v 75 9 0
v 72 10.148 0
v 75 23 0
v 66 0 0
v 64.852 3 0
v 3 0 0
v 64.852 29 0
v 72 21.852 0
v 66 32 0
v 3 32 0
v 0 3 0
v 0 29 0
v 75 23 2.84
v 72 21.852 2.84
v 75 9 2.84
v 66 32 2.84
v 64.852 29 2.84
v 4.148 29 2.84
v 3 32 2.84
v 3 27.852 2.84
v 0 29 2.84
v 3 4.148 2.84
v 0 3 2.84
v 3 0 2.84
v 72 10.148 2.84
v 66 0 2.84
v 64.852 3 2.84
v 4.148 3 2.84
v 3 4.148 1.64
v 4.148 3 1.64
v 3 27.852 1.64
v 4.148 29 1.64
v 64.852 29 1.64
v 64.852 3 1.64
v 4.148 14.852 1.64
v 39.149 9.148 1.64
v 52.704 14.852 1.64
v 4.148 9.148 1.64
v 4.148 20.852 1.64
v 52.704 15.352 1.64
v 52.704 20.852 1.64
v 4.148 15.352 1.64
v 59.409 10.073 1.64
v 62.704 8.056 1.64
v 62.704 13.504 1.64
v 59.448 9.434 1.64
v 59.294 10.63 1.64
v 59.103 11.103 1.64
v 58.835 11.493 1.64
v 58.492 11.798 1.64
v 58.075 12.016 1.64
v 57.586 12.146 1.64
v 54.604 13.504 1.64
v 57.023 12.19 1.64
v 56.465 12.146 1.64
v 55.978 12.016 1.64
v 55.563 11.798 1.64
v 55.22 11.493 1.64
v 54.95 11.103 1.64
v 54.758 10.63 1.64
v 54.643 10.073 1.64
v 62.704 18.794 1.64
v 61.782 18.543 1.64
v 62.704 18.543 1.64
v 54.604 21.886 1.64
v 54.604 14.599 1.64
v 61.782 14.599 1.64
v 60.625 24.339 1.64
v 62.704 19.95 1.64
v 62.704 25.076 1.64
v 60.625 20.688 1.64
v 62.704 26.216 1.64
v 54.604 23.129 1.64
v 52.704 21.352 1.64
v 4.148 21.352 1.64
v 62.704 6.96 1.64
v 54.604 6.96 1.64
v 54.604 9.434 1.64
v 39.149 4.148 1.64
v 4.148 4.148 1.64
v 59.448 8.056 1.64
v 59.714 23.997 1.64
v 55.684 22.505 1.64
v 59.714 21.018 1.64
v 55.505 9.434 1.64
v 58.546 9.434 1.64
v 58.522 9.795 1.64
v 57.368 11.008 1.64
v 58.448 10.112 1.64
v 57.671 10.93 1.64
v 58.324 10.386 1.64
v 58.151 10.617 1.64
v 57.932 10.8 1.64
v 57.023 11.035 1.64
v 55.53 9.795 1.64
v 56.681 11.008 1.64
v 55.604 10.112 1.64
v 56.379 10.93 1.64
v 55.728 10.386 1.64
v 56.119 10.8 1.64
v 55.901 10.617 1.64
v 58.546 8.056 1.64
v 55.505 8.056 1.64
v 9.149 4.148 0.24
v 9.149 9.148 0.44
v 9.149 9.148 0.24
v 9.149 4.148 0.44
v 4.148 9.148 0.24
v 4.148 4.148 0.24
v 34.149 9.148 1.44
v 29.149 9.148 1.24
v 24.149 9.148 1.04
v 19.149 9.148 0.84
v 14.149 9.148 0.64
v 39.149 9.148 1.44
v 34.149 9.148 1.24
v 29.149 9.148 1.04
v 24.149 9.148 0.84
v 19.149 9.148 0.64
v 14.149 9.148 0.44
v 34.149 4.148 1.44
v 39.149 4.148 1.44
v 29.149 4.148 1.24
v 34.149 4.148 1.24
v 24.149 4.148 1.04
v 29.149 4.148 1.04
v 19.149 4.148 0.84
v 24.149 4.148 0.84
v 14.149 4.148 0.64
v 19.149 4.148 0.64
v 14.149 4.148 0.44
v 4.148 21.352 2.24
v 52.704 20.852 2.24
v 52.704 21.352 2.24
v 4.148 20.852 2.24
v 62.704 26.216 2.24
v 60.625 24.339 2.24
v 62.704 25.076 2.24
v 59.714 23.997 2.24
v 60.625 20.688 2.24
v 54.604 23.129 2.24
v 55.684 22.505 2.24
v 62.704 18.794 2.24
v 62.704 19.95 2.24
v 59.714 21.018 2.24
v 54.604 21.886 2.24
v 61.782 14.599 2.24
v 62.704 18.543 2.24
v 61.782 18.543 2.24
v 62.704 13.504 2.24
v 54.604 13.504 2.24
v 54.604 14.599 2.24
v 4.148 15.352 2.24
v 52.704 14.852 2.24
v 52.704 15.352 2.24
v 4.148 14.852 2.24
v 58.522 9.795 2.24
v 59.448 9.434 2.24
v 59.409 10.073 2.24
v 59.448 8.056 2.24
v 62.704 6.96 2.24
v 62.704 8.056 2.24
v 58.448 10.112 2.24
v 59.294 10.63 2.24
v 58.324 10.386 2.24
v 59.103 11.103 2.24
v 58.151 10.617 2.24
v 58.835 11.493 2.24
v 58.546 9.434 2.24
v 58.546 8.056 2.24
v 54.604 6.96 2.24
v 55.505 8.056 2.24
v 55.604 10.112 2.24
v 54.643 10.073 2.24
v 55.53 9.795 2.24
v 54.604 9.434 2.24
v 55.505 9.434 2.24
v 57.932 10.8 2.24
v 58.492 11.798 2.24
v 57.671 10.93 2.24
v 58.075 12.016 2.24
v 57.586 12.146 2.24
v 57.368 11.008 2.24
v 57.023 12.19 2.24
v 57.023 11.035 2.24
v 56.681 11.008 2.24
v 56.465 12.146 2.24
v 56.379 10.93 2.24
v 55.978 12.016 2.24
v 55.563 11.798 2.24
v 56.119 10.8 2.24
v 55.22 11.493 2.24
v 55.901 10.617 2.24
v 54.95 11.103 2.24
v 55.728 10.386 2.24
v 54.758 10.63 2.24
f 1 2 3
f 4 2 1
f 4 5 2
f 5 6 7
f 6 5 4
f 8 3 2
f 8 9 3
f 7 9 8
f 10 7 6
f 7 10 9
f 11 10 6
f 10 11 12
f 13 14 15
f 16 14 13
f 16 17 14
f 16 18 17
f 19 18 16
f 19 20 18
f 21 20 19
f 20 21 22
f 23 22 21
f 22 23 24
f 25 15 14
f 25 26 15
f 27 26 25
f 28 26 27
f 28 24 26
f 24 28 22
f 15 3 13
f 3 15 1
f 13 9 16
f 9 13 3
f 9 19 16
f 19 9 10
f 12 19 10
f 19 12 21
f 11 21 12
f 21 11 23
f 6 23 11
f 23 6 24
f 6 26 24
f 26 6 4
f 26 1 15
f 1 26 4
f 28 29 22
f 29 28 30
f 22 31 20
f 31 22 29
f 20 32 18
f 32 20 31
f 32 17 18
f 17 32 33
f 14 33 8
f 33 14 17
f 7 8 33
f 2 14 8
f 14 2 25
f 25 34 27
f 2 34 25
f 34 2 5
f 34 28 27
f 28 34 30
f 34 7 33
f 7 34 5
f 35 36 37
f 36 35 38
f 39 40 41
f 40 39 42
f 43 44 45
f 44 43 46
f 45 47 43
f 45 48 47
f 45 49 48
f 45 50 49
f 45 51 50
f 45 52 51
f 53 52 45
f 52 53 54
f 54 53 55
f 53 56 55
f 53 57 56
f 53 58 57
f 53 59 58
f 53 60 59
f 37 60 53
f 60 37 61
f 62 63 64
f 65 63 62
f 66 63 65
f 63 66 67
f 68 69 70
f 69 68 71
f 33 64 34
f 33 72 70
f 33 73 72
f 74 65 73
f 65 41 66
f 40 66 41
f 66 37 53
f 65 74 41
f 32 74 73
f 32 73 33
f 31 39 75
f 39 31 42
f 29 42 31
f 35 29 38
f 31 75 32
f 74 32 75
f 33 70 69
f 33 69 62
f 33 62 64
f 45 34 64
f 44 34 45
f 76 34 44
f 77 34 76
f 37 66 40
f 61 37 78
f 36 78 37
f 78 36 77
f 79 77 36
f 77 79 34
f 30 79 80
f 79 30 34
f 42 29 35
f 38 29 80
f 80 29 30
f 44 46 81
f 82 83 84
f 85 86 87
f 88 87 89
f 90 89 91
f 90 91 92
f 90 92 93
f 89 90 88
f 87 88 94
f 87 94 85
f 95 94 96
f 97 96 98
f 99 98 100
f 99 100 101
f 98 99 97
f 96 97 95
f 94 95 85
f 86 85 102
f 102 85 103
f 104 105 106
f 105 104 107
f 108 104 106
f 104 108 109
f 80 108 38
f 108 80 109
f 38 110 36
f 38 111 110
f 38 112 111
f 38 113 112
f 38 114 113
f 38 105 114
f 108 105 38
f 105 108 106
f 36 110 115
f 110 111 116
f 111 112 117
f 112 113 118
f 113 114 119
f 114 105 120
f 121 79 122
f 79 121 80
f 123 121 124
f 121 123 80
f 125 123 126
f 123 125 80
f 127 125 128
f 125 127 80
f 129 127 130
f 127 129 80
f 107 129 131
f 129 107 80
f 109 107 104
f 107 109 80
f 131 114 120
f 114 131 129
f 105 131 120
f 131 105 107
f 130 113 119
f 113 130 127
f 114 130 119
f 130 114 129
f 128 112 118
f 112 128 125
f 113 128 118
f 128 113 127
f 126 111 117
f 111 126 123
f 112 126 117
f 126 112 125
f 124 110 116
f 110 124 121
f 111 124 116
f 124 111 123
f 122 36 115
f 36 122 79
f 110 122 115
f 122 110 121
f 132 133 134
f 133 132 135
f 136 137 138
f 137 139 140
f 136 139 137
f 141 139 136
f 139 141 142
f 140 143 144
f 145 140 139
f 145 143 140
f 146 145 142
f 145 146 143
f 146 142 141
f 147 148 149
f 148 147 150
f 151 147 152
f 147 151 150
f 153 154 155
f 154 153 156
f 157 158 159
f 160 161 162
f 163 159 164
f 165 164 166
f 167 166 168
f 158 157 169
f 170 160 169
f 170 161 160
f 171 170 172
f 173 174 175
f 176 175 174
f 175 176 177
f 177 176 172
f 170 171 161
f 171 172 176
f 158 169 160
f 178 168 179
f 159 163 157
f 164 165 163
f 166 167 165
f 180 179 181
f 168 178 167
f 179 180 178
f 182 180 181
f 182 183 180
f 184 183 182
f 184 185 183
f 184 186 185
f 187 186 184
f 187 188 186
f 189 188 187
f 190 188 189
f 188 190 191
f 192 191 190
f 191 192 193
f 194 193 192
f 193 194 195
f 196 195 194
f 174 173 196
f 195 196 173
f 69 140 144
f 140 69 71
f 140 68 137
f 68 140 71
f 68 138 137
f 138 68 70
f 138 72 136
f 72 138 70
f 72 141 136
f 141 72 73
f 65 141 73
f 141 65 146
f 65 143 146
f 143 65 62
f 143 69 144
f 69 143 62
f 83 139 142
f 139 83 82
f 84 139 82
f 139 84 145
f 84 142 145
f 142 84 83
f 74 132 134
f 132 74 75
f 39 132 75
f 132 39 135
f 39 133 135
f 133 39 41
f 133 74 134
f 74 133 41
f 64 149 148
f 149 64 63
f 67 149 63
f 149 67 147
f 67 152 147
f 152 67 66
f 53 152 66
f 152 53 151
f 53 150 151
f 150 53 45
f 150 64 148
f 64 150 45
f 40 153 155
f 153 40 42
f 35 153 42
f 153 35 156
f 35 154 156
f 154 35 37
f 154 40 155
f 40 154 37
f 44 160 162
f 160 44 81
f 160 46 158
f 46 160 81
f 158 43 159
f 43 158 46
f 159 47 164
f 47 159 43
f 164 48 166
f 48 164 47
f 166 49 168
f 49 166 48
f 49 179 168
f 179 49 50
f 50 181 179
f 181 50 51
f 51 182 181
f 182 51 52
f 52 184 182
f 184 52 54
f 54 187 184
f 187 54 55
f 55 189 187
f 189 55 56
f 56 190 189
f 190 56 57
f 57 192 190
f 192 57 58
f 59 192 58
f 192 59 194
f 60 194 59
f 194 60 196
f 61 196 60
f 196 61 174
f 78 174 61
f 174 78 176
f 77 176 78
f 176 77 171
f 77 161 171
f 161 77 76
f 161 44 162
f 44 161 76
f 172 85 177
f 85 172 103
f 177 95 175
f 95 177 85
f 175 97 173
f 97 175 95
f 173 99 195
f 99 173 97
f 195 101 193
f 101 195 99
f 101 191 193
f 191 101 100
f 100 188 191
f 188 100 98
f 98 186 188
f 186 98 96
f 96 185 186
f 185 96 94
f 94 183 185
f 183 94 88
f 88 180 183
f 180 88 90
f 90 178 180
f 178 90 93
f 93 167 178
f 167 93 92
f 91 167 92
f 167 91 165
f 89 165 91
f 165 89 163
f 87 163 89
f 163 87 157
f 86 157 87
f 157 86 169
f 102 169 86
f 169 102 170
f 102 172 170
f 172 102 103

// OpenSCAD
// Swatch to fit 8 in a 2x1x6 GridFinity bin, based in shape
// around the Extrutim printables design, which is based around
// someone else's anyway.  Defaults here will give you a swatch with two spaces
// to write–in the manufacturer and color name (if useful).  All you need to do
// is customize the material.

// Copyright 2024, Sam Vilain.  All rights reserved.
// You can use this under the terms of the GPL version 3 or later.  For other
// terms, please get in touch.

/* [Swatch Print Settings] */
initial_layer_height = 0.24;
layer_height = 0.2;

// Color printing mode
color_mode = "MMU";  // [MMU:Multiple filament changes, Manual:Single filament change, Mono:Single color swatches]
// check to produce just the body STL.  It will have no label unless "single filament change" is selected.
no_label = false;
// check to produce just the label STL.   If both options are left unchecked, a single monocolor swatch STL will be produced.
no_body = false;


/* [Filament Details] */
// Use underscores to print a line for write–in (or label–on)
manufacturer = "";
//manufacturer = "________________";
// the main material for printing purposes
material = "PLA";  // [PLA, PETG, ABS, ASA, TPU, PC, PCABS, PCTG, PP, PET, PA, PPA, PAHT, ____]
// to add –CF, –GF, etc (or a "+" for unspecified copolymers)
filler = ""; // ["":None, +:Copolymer, CF: Carbon Fiber, GF: Glass Fiber, WF: Wood, X: Other]
// the color may be obvious, but if the vendor has a lot of colors for a material, this can help make sure the swatchholder gets the right one when ordering
color_name = "";

/* [Verbose filament details] */
// These extra details are available for scripts converting information from filament profiles to swatches or can be set manually..  Most importantly, to help give quick cost vs color decisions:
cost_per_kg = -1;

// HTML color code; 3-digit websafe color codes or full 6-digit value.  Printed on the swatch, and used to color the preview in OpenSCAD.
color_code = "";
// Color for the label; if printing single color swatches, using a color with good contrast will make the label easier to read here in OpenSCAD, but otherwise have no effect.  Clear this entry to show the label in the same color as the swatch.
contrast_color = "#000";

// set to add print setings to the swatch
nozzle_temp_range = [-1, -1];
bed_temp_range = [-1, -1];
chamber_temp_range = [-1, -1];
part_fan_speed = [-1, -1];
// If you just want to type what goes in the print settings space, enter it here
print_settings_override = "";

/* [Font for Manufacturer] */
// The font to use for the Manufacturer
label_manufacturer_font = "Gotham";
// If the manufacturer name doesn't fit, try tweaking this, and treat font height as a last resort.  Various fonts have different names for these widths, nothing is standard, X11 font names were the Betamax of this
label_manufacturer_font_width = "";  // ["":Default, Narrow, XNarrow:Extra Narrow, Cond:"Cond(ensed)", Condensed]
// Use the boldest font weight which fits and is still legible for best printability
label_manufacturer_font_weight = "Bold";  // ["":Default, Thin, Light, Book, Medium, Bold, Heavy, Ultra]
label_manufacturer_font_style = "";  // ["":Regular, Italic]
label_manufacturer_font_height = 7; // [5:0.25:8]

/* [Font for Material Code] */
// The font to use for the Material: recommend to use the same as the major font.
label_material_font = "Gotham"; 
// Shrink this before lowering the font height for longer filament types
label_material_font_width = "Narrow";  // ["":Default, Narrow, XNarrow:Extra Narrow, Cond:"Cond(ensed)", Condensed]
label_material_font_weight = "Bold";  // ["":Default, Thin, Light, Book, Medium, Bold, Heavy, Ultra]
label_material_font_style = "";  // ["":Regular, Italic,]
label_material_font_height = 8; // [6:0.5:10]

/* [Font for other details] */
// The font to use for everything else
label_details_font = "Noto Sans";
label_details_font_width = "";  // ["":Default, SemiCondensed, Condensed, ExtraCondensed]
label_details_font_weight = "";  // [Thin, ExtraLight, Light, Medium, "":Default, SemiBold, Bold, ExtraBold, Black]
label_details_font_style = "";  // ["":Regular, Italic]
label_details_font_height = 5; // [4:0.25:7]

// Just the color name in italics looks good and squeezes a bit more in, it seems
label_color_name_font_style = "Italic"; // ["":Regular, Italic]

/* [Font for print settings] */
// if temperatures are specified, they are printed with this width and height; font and weight come from the "details" setting.
label_settings_font_width = ""; //  ["":Default, SemiCondensed, Condensed, ExtraCondensed, Narrow, XNarrow:Extra Narrow, Cond:"Cond(ensed)", Condensed]
label_settings_font_height = 4; // [3:0.25:6]
// Pick a symbol for each setting prefix, but sadly OpenSCAD doesn't do a good job of finding the appropriate font that contains the glyphs for the unicode characters.
label_settings_nozzle_temp_glyph = "T:";  // ["T:", Ⓣ, 🅃, 🆃, "N:", Ⓝ, 🄽, 🅽, ↓, 🌡, ⚺, ⛉, ⛊]
label_settings_bed_temp_glyph = "B:";  // ["B:", Ⓑ , 🄱, 🅱, ■, ⬜, ⬚, □, 🞐, 🞑, 🞒, 🞓, 🛏]
label_settings_chamber_temp_glyph = "C:";  // ["C:", Ⓒ, 🄲, 🅲, ⛶, ▣, 🌤, ♨, 🌡]
label_settings_fan_speed_glyph = "F:";  // ["F:", Ⓒ, 🄲, 🅲, ⛶, ▣, 🌤, ♨, 🌡]

/* [Swatch Dimensions] */
// Maximum swatch thickness
swatch_thickness = 3;  // [1.5:0.1:4.5]
body_thickness = 1.7; // [1:0.1:3]
// label thickness is the difference between the above two, up to this value
label_max_thickness = 0.65; // [0.2:0.05:1]

// Overall dimensions
swatch_length = 75;  // [50:0.5:83]
swatch_width = 32;   // [20:0.5:37]

handle_size = 9;  // [6:0.5:10]

/* [Extra Dimension Settings] */
// space between lines, in mm
label_line_spacing = 1; // [0.5:0.1:2]

// width of the translucency staircase, in mm
staircase_size = 5; // [3:0.5:12]

// how wide the edge is
edge_width = 3; // [0:0.1:5]
corner_chamfer = 3; // [0:0.1:4]

// convert a thickness to a layer count or number
function layer_n(thickness) = (
  thickness > initial_layer_height?
      (floor((thickness - initial_layer_height)/layer_height)+1)
  :   (thickness <= 0 ? 0 : 1)
);

// calculate various dimensional settings
swatch_layers = layer_n(swatch_thickness);
body_layers =  layer_n(body_thickness);

label_max_layers = floor(label_max_thickness / layer_height);
label_layers =  color_mode == "Manual" ? (swatch_layers - body_layers) : min(swatch_layers - body_layers, label_max_layers);
echo(str("Layers: Swatch: ", swatch_layers, ", body: ", body_layers, " label: ", label_layers));

function layers_thick(n) = layer_height * n;
function layer_top(n) = initial_layer_height + (layer_height * (n-1));

label_thickness = layer_height * label_layers;

verbose_height = (cost_per_kg > 0 ? label_details_font_height + label_line_spacing : 0) + (
    color_code != "" ? label_details_font_height + label_line_spacing : 0);


body_length = swatch_length - edge_width - handle_size - edge_width * sin(360/16);
body_width = swatch_width - edge_width * 2;

label_margin = corner_chamfer + corner_chamfer*sin(360/16);
label_origin = [label_margin, swatch_width - label_margin, layer_top(body_layers)];
label_inner_margin = label_margin - edge_width;
echo(str("body width: ", body_width, ", label_margin: ", label_margin, ", edge_width: ", edge_width));
label_inner_width = body_width - label_inner_margin*2;
label_inner_length = body_length - label_inner_margin*2;

echo(str("height of verbose text: ", verbose_height, "mm"));

staircase_max_length = label_inner_length - label_material_font_height - label_line_spacing*2 - verbose_height;
staircase_steps = min(body_layers-1, floor(staircase_max_length / staircase_size));
echo(str("staircase max length: ", staircase_max_length, "mm, steps: ", staircase_steps));

function spaced(maybe_word, new_word) = str(maybe_word, ((maybe_word == "" || maybe_word[len(maybe_word)-1] == " ") && new_word != "") ? "" : " ", new_word);

function font_id(font_name, font_width="", font_weight="", font_style="") = str(font_name, (font_width != "" || font_weight != "" || font_style != "") ? str(":style=", spaced(font_width, spaced(font_weight, font_style))) : "");

label_material_code = str(material, (filler == "" ? "" : str(filler == "+" ? "" : "-", filler)));
label_material_font_id = font_id(label_material_font, font_width=label_material_font_width, font_weight=label_material_font_weight, font_style=label_material_font_style);
label_manufacturer_font_id = font_id(label_manufacturer_font, font_width=label_manufacturer_font_width, font_weight=label_manufacturer_font_weight, font_style=label_manufacturer_font_style);
label_color_name_font_id = font_id(label_details_font, font_width=label_details_font_width, font_weight=label_details_font_weight, font_style=label_color_name_font_style);
label_details_font_id = font_id(label_details_font, font_width=label_details_font_width, font_weight=label_details_font_weight, font_style=label_details_font_style);
label_settings_font_id = font_id(label_details_font, font_width=label_settings_font_width, font_weight=label_details_font_weight, font_style=label_details_font_style);

// some kind of input guarding for people poking stuff in via CLI arguments
function value_not_N(value) = (value == undef || value < 0);
function range_is_nil(value_range) = value_range == undef || len(value_range) == 0 || value_not_N(value_range[0]);

function show_value_range(value_label, value_range) = (
    range_is_nil(value_range) ? "" : str(
        value_label,
        (value_not_N(value_range[1]) || value_range[0] == value_range[1])
            ? value_range[0]
            : str(value_range[0], "-", value_range[1])
    ));
    
function show_value_approx(value_label, value_range) = (
    range_is_nil(value_range) ? "" : str(
        value_label,
        (value_not_N(value_range[1]) || value_range[0] == value_range[1])
            ? value_range[0]
            : str((value_range[0]+value_range[1])/2, "±", (value_range[1] - value_range[0])/2)
    ));

function show_range(value_label, value_range) = range_is_nil(value_range) ? "" : (len(show_value_range(value_label, value_range)) < len(show_value_approx(value_label, value_range)) ? show_value_range(value_label, value_range) : show_value_approx(value_label, value_range));

nozzle_temp_range_text = show_range(label_settings_nozzle_temp_glyph, nozzle_temp_range);
bed_temp_range_text = show_range(label_settings_bed_temp_glyph, bed_temp_range);
chamber_temp_range_text = show_range(label_settings_chamber_temp_glyph, chamber_temp_range);
fan_speed_range_text = show_range(label_settings_fan_speed_glyph, part_fan_speed);

print_settings_text = print_settings_override != "" ? print_settings_override : str(
    nozzle_temp_range_text,
    (nozzle_temp_range_text != "" && bed_temp_range_text != "") ? " " : "",
    bed_temp_range_text,
    (chamber_temp_range_text != "" && (nozzle_temp_range_text != "" || bed_temp_range_text != "")) ? " " : "",
    chamber_temp_range_text,
    (fan_speed_range_text != "" && (nozzle_temp_range_text != "" || bed_temp_range_text != "" || chamber_temp_range_text != "")) ? " " : ""
);

function staircase_layer(step_num) = layer_n(
        initial_layer_height + (layer_top(body_layers-1) - layer_top(1))
        / (staircase_steps - 1) * step_num
);

function color_or_default(color_entry) = color_entry == "" ? "yellow" : color_entry;

module swatch_outline(border_height = swatch_thickness, border_width = swatch_thickness) {
        difference() {
    polygon([
        [0, corner_chamfer],
        [corner_chamfer, 0],
        [swatch_length - handle_size, 0],
        [swatch_length, handle_size],
        [swatch_length, swatch_width - handle_size],
        [swatch_length - handle_size, swatch_width],
        [corner_chamfer, swatch_width],
        [0, swatch_width - corner_chamfer],        
    ]);
    corner_chamfer_16th = corner_chamfer*sin(360/16);
    polygon([
        [border_width, corner_chamfer + corner_chamfer_16th],
        [corner_chamfer + corner_chamfer_16th, border_width],
        [swatch_length - handle_size - corner_chamfer_16th, border_width],
        [swatch_length - border_width, handle_size + corner_chamfer_16th],
        [swatch_length - border_width, swatch_width - (handle_size + corner_chamfer_16th)],
        [swatch_length - handle_size - corner_chamfer_16th, swatch_width - border_width],
        [corner_chamfer + corner_chamfer_16th, swatch_width - border_width],
                [border_width, swatch_width - (corner_chamfer + corner_chamfer_16th)],

    ]);
    }
}

module swatch_basic() {

    if (!no_body) {
        color(color_or_default(color_code))
        difference() {
            union() {
                border_width = swatch_thickness;
                linear_extrude(layer_top(swatch_layers))
                    swatch_outline(border_width);
                translate([border_width, border_width, 0])
                    cube([body_length, body_width, layer_top(body_layers)]);
            }
 
            echo(str("Cutting ", staircase_steps, " steps"));
            for(step = [0:staircase_steps-1]) {
                step_layer = staircase_layer(step);
                stair_size = [staircase_size, staircase_size,
                    layer_top(body_layers+1) - layer_top(step_layer)];
                stair_offset = [(step) * staircase_size, 0, layer_top(step_layer)];
                position = [label_margin, label_margin, 0] + stair_offset;
            
                echo (str("Step ", step+1, ": layer is ", step_layer, " (top at ", layer_top(step_layer), "), offset ", stair_offset));
                echo (str("Step ", step+1, ": drawing a cube at ", position, " size ", stair_size));                                                            
                translate(position)
                    cube(stair_size + [0.001, 0, 0]);    
            }
        }
    }
    translate(label_origin)
        children();
}

module label_text_flat() {
    translate([0, -label_manufacturer_font_height, 0]) {
        if (manufacturer != "") {
            text(manufacturer, size=label_manufacturer_font_height, font=label_manufacturer_font_id);
        } else {
            square([staircase_max_length - label_line_spacing, label_line_spacing/2]);
        }
        translate([0, -label_details_font_height-label_line_spacing, 0]) {
            if (color_name != "") {
                text(color_name, size=label_details_font_height, font=label_color_name_font_id);
            } else {
                square([staircase_max_length - label_line_spacing, label_line_spacing/2]);
            }
            if (print_settings_text) {
                translate([0, -label_settings_font_height-label_line_spacing, 0]) {
                    text(print_settings_text, size=label_settings_font_height, font=label_settings_font_id);
                }
            }
        }
    }
    echo(str("Drawing material label: ", label_material_code, "; font=", label_material_font_id, " - label inner length: ", label_inner_length));

    translate([label_inner_length - label_line_spacing, -label_inner_width/2, 0]) {
        rotate([0,0,90])
            text(label_material_code, size=label_material_font_height, font=label_material_font_id, halign="center");
        translate([-label_material_font_height-label_line_spacing, 0, 0]) {
        rotate([0,0,90])
            if (color_code != "") {
            text(color_code, size=label_details_font_height, font=label_details_font_id, halign="center");
            }
            if (cost_per_kg > 0) {
                translate([color_code != ""?-label_details_font_height-label_line_spacing:0, 0, 0]) {
                    rotate([0,0,90])
                        text(str("$", cost_per_kg, "/kg"), size=label_details_font_height, font=label_details_font_id, halign="center");
                }
            }
        }
    }
/*
    translate([0, -label_inner_width, 0])
    square([label_inner_length, 1]);
   */ 
}

swatch_basic() {
    if (color_mode == "Manual" && label_layers > 1 && !no_body) {
        color(color_or_default(color_code))
            linear_extrude(layers_thick(label_layers - 1))
                label_text_flat();
    }
    if (!no_label) {
        color(color_or_default(contrast_color != "" ? contrast_color : color_code)) {
            translate([0,0,color_mode == "Manual" ? layers_thick(label_layers - 1) : 0])
                linear_extrude(layers_thick(color_mode == "Manual" ? 1 : label_layers)) {
                    label_text_flat();
                }
        }
    }
}
